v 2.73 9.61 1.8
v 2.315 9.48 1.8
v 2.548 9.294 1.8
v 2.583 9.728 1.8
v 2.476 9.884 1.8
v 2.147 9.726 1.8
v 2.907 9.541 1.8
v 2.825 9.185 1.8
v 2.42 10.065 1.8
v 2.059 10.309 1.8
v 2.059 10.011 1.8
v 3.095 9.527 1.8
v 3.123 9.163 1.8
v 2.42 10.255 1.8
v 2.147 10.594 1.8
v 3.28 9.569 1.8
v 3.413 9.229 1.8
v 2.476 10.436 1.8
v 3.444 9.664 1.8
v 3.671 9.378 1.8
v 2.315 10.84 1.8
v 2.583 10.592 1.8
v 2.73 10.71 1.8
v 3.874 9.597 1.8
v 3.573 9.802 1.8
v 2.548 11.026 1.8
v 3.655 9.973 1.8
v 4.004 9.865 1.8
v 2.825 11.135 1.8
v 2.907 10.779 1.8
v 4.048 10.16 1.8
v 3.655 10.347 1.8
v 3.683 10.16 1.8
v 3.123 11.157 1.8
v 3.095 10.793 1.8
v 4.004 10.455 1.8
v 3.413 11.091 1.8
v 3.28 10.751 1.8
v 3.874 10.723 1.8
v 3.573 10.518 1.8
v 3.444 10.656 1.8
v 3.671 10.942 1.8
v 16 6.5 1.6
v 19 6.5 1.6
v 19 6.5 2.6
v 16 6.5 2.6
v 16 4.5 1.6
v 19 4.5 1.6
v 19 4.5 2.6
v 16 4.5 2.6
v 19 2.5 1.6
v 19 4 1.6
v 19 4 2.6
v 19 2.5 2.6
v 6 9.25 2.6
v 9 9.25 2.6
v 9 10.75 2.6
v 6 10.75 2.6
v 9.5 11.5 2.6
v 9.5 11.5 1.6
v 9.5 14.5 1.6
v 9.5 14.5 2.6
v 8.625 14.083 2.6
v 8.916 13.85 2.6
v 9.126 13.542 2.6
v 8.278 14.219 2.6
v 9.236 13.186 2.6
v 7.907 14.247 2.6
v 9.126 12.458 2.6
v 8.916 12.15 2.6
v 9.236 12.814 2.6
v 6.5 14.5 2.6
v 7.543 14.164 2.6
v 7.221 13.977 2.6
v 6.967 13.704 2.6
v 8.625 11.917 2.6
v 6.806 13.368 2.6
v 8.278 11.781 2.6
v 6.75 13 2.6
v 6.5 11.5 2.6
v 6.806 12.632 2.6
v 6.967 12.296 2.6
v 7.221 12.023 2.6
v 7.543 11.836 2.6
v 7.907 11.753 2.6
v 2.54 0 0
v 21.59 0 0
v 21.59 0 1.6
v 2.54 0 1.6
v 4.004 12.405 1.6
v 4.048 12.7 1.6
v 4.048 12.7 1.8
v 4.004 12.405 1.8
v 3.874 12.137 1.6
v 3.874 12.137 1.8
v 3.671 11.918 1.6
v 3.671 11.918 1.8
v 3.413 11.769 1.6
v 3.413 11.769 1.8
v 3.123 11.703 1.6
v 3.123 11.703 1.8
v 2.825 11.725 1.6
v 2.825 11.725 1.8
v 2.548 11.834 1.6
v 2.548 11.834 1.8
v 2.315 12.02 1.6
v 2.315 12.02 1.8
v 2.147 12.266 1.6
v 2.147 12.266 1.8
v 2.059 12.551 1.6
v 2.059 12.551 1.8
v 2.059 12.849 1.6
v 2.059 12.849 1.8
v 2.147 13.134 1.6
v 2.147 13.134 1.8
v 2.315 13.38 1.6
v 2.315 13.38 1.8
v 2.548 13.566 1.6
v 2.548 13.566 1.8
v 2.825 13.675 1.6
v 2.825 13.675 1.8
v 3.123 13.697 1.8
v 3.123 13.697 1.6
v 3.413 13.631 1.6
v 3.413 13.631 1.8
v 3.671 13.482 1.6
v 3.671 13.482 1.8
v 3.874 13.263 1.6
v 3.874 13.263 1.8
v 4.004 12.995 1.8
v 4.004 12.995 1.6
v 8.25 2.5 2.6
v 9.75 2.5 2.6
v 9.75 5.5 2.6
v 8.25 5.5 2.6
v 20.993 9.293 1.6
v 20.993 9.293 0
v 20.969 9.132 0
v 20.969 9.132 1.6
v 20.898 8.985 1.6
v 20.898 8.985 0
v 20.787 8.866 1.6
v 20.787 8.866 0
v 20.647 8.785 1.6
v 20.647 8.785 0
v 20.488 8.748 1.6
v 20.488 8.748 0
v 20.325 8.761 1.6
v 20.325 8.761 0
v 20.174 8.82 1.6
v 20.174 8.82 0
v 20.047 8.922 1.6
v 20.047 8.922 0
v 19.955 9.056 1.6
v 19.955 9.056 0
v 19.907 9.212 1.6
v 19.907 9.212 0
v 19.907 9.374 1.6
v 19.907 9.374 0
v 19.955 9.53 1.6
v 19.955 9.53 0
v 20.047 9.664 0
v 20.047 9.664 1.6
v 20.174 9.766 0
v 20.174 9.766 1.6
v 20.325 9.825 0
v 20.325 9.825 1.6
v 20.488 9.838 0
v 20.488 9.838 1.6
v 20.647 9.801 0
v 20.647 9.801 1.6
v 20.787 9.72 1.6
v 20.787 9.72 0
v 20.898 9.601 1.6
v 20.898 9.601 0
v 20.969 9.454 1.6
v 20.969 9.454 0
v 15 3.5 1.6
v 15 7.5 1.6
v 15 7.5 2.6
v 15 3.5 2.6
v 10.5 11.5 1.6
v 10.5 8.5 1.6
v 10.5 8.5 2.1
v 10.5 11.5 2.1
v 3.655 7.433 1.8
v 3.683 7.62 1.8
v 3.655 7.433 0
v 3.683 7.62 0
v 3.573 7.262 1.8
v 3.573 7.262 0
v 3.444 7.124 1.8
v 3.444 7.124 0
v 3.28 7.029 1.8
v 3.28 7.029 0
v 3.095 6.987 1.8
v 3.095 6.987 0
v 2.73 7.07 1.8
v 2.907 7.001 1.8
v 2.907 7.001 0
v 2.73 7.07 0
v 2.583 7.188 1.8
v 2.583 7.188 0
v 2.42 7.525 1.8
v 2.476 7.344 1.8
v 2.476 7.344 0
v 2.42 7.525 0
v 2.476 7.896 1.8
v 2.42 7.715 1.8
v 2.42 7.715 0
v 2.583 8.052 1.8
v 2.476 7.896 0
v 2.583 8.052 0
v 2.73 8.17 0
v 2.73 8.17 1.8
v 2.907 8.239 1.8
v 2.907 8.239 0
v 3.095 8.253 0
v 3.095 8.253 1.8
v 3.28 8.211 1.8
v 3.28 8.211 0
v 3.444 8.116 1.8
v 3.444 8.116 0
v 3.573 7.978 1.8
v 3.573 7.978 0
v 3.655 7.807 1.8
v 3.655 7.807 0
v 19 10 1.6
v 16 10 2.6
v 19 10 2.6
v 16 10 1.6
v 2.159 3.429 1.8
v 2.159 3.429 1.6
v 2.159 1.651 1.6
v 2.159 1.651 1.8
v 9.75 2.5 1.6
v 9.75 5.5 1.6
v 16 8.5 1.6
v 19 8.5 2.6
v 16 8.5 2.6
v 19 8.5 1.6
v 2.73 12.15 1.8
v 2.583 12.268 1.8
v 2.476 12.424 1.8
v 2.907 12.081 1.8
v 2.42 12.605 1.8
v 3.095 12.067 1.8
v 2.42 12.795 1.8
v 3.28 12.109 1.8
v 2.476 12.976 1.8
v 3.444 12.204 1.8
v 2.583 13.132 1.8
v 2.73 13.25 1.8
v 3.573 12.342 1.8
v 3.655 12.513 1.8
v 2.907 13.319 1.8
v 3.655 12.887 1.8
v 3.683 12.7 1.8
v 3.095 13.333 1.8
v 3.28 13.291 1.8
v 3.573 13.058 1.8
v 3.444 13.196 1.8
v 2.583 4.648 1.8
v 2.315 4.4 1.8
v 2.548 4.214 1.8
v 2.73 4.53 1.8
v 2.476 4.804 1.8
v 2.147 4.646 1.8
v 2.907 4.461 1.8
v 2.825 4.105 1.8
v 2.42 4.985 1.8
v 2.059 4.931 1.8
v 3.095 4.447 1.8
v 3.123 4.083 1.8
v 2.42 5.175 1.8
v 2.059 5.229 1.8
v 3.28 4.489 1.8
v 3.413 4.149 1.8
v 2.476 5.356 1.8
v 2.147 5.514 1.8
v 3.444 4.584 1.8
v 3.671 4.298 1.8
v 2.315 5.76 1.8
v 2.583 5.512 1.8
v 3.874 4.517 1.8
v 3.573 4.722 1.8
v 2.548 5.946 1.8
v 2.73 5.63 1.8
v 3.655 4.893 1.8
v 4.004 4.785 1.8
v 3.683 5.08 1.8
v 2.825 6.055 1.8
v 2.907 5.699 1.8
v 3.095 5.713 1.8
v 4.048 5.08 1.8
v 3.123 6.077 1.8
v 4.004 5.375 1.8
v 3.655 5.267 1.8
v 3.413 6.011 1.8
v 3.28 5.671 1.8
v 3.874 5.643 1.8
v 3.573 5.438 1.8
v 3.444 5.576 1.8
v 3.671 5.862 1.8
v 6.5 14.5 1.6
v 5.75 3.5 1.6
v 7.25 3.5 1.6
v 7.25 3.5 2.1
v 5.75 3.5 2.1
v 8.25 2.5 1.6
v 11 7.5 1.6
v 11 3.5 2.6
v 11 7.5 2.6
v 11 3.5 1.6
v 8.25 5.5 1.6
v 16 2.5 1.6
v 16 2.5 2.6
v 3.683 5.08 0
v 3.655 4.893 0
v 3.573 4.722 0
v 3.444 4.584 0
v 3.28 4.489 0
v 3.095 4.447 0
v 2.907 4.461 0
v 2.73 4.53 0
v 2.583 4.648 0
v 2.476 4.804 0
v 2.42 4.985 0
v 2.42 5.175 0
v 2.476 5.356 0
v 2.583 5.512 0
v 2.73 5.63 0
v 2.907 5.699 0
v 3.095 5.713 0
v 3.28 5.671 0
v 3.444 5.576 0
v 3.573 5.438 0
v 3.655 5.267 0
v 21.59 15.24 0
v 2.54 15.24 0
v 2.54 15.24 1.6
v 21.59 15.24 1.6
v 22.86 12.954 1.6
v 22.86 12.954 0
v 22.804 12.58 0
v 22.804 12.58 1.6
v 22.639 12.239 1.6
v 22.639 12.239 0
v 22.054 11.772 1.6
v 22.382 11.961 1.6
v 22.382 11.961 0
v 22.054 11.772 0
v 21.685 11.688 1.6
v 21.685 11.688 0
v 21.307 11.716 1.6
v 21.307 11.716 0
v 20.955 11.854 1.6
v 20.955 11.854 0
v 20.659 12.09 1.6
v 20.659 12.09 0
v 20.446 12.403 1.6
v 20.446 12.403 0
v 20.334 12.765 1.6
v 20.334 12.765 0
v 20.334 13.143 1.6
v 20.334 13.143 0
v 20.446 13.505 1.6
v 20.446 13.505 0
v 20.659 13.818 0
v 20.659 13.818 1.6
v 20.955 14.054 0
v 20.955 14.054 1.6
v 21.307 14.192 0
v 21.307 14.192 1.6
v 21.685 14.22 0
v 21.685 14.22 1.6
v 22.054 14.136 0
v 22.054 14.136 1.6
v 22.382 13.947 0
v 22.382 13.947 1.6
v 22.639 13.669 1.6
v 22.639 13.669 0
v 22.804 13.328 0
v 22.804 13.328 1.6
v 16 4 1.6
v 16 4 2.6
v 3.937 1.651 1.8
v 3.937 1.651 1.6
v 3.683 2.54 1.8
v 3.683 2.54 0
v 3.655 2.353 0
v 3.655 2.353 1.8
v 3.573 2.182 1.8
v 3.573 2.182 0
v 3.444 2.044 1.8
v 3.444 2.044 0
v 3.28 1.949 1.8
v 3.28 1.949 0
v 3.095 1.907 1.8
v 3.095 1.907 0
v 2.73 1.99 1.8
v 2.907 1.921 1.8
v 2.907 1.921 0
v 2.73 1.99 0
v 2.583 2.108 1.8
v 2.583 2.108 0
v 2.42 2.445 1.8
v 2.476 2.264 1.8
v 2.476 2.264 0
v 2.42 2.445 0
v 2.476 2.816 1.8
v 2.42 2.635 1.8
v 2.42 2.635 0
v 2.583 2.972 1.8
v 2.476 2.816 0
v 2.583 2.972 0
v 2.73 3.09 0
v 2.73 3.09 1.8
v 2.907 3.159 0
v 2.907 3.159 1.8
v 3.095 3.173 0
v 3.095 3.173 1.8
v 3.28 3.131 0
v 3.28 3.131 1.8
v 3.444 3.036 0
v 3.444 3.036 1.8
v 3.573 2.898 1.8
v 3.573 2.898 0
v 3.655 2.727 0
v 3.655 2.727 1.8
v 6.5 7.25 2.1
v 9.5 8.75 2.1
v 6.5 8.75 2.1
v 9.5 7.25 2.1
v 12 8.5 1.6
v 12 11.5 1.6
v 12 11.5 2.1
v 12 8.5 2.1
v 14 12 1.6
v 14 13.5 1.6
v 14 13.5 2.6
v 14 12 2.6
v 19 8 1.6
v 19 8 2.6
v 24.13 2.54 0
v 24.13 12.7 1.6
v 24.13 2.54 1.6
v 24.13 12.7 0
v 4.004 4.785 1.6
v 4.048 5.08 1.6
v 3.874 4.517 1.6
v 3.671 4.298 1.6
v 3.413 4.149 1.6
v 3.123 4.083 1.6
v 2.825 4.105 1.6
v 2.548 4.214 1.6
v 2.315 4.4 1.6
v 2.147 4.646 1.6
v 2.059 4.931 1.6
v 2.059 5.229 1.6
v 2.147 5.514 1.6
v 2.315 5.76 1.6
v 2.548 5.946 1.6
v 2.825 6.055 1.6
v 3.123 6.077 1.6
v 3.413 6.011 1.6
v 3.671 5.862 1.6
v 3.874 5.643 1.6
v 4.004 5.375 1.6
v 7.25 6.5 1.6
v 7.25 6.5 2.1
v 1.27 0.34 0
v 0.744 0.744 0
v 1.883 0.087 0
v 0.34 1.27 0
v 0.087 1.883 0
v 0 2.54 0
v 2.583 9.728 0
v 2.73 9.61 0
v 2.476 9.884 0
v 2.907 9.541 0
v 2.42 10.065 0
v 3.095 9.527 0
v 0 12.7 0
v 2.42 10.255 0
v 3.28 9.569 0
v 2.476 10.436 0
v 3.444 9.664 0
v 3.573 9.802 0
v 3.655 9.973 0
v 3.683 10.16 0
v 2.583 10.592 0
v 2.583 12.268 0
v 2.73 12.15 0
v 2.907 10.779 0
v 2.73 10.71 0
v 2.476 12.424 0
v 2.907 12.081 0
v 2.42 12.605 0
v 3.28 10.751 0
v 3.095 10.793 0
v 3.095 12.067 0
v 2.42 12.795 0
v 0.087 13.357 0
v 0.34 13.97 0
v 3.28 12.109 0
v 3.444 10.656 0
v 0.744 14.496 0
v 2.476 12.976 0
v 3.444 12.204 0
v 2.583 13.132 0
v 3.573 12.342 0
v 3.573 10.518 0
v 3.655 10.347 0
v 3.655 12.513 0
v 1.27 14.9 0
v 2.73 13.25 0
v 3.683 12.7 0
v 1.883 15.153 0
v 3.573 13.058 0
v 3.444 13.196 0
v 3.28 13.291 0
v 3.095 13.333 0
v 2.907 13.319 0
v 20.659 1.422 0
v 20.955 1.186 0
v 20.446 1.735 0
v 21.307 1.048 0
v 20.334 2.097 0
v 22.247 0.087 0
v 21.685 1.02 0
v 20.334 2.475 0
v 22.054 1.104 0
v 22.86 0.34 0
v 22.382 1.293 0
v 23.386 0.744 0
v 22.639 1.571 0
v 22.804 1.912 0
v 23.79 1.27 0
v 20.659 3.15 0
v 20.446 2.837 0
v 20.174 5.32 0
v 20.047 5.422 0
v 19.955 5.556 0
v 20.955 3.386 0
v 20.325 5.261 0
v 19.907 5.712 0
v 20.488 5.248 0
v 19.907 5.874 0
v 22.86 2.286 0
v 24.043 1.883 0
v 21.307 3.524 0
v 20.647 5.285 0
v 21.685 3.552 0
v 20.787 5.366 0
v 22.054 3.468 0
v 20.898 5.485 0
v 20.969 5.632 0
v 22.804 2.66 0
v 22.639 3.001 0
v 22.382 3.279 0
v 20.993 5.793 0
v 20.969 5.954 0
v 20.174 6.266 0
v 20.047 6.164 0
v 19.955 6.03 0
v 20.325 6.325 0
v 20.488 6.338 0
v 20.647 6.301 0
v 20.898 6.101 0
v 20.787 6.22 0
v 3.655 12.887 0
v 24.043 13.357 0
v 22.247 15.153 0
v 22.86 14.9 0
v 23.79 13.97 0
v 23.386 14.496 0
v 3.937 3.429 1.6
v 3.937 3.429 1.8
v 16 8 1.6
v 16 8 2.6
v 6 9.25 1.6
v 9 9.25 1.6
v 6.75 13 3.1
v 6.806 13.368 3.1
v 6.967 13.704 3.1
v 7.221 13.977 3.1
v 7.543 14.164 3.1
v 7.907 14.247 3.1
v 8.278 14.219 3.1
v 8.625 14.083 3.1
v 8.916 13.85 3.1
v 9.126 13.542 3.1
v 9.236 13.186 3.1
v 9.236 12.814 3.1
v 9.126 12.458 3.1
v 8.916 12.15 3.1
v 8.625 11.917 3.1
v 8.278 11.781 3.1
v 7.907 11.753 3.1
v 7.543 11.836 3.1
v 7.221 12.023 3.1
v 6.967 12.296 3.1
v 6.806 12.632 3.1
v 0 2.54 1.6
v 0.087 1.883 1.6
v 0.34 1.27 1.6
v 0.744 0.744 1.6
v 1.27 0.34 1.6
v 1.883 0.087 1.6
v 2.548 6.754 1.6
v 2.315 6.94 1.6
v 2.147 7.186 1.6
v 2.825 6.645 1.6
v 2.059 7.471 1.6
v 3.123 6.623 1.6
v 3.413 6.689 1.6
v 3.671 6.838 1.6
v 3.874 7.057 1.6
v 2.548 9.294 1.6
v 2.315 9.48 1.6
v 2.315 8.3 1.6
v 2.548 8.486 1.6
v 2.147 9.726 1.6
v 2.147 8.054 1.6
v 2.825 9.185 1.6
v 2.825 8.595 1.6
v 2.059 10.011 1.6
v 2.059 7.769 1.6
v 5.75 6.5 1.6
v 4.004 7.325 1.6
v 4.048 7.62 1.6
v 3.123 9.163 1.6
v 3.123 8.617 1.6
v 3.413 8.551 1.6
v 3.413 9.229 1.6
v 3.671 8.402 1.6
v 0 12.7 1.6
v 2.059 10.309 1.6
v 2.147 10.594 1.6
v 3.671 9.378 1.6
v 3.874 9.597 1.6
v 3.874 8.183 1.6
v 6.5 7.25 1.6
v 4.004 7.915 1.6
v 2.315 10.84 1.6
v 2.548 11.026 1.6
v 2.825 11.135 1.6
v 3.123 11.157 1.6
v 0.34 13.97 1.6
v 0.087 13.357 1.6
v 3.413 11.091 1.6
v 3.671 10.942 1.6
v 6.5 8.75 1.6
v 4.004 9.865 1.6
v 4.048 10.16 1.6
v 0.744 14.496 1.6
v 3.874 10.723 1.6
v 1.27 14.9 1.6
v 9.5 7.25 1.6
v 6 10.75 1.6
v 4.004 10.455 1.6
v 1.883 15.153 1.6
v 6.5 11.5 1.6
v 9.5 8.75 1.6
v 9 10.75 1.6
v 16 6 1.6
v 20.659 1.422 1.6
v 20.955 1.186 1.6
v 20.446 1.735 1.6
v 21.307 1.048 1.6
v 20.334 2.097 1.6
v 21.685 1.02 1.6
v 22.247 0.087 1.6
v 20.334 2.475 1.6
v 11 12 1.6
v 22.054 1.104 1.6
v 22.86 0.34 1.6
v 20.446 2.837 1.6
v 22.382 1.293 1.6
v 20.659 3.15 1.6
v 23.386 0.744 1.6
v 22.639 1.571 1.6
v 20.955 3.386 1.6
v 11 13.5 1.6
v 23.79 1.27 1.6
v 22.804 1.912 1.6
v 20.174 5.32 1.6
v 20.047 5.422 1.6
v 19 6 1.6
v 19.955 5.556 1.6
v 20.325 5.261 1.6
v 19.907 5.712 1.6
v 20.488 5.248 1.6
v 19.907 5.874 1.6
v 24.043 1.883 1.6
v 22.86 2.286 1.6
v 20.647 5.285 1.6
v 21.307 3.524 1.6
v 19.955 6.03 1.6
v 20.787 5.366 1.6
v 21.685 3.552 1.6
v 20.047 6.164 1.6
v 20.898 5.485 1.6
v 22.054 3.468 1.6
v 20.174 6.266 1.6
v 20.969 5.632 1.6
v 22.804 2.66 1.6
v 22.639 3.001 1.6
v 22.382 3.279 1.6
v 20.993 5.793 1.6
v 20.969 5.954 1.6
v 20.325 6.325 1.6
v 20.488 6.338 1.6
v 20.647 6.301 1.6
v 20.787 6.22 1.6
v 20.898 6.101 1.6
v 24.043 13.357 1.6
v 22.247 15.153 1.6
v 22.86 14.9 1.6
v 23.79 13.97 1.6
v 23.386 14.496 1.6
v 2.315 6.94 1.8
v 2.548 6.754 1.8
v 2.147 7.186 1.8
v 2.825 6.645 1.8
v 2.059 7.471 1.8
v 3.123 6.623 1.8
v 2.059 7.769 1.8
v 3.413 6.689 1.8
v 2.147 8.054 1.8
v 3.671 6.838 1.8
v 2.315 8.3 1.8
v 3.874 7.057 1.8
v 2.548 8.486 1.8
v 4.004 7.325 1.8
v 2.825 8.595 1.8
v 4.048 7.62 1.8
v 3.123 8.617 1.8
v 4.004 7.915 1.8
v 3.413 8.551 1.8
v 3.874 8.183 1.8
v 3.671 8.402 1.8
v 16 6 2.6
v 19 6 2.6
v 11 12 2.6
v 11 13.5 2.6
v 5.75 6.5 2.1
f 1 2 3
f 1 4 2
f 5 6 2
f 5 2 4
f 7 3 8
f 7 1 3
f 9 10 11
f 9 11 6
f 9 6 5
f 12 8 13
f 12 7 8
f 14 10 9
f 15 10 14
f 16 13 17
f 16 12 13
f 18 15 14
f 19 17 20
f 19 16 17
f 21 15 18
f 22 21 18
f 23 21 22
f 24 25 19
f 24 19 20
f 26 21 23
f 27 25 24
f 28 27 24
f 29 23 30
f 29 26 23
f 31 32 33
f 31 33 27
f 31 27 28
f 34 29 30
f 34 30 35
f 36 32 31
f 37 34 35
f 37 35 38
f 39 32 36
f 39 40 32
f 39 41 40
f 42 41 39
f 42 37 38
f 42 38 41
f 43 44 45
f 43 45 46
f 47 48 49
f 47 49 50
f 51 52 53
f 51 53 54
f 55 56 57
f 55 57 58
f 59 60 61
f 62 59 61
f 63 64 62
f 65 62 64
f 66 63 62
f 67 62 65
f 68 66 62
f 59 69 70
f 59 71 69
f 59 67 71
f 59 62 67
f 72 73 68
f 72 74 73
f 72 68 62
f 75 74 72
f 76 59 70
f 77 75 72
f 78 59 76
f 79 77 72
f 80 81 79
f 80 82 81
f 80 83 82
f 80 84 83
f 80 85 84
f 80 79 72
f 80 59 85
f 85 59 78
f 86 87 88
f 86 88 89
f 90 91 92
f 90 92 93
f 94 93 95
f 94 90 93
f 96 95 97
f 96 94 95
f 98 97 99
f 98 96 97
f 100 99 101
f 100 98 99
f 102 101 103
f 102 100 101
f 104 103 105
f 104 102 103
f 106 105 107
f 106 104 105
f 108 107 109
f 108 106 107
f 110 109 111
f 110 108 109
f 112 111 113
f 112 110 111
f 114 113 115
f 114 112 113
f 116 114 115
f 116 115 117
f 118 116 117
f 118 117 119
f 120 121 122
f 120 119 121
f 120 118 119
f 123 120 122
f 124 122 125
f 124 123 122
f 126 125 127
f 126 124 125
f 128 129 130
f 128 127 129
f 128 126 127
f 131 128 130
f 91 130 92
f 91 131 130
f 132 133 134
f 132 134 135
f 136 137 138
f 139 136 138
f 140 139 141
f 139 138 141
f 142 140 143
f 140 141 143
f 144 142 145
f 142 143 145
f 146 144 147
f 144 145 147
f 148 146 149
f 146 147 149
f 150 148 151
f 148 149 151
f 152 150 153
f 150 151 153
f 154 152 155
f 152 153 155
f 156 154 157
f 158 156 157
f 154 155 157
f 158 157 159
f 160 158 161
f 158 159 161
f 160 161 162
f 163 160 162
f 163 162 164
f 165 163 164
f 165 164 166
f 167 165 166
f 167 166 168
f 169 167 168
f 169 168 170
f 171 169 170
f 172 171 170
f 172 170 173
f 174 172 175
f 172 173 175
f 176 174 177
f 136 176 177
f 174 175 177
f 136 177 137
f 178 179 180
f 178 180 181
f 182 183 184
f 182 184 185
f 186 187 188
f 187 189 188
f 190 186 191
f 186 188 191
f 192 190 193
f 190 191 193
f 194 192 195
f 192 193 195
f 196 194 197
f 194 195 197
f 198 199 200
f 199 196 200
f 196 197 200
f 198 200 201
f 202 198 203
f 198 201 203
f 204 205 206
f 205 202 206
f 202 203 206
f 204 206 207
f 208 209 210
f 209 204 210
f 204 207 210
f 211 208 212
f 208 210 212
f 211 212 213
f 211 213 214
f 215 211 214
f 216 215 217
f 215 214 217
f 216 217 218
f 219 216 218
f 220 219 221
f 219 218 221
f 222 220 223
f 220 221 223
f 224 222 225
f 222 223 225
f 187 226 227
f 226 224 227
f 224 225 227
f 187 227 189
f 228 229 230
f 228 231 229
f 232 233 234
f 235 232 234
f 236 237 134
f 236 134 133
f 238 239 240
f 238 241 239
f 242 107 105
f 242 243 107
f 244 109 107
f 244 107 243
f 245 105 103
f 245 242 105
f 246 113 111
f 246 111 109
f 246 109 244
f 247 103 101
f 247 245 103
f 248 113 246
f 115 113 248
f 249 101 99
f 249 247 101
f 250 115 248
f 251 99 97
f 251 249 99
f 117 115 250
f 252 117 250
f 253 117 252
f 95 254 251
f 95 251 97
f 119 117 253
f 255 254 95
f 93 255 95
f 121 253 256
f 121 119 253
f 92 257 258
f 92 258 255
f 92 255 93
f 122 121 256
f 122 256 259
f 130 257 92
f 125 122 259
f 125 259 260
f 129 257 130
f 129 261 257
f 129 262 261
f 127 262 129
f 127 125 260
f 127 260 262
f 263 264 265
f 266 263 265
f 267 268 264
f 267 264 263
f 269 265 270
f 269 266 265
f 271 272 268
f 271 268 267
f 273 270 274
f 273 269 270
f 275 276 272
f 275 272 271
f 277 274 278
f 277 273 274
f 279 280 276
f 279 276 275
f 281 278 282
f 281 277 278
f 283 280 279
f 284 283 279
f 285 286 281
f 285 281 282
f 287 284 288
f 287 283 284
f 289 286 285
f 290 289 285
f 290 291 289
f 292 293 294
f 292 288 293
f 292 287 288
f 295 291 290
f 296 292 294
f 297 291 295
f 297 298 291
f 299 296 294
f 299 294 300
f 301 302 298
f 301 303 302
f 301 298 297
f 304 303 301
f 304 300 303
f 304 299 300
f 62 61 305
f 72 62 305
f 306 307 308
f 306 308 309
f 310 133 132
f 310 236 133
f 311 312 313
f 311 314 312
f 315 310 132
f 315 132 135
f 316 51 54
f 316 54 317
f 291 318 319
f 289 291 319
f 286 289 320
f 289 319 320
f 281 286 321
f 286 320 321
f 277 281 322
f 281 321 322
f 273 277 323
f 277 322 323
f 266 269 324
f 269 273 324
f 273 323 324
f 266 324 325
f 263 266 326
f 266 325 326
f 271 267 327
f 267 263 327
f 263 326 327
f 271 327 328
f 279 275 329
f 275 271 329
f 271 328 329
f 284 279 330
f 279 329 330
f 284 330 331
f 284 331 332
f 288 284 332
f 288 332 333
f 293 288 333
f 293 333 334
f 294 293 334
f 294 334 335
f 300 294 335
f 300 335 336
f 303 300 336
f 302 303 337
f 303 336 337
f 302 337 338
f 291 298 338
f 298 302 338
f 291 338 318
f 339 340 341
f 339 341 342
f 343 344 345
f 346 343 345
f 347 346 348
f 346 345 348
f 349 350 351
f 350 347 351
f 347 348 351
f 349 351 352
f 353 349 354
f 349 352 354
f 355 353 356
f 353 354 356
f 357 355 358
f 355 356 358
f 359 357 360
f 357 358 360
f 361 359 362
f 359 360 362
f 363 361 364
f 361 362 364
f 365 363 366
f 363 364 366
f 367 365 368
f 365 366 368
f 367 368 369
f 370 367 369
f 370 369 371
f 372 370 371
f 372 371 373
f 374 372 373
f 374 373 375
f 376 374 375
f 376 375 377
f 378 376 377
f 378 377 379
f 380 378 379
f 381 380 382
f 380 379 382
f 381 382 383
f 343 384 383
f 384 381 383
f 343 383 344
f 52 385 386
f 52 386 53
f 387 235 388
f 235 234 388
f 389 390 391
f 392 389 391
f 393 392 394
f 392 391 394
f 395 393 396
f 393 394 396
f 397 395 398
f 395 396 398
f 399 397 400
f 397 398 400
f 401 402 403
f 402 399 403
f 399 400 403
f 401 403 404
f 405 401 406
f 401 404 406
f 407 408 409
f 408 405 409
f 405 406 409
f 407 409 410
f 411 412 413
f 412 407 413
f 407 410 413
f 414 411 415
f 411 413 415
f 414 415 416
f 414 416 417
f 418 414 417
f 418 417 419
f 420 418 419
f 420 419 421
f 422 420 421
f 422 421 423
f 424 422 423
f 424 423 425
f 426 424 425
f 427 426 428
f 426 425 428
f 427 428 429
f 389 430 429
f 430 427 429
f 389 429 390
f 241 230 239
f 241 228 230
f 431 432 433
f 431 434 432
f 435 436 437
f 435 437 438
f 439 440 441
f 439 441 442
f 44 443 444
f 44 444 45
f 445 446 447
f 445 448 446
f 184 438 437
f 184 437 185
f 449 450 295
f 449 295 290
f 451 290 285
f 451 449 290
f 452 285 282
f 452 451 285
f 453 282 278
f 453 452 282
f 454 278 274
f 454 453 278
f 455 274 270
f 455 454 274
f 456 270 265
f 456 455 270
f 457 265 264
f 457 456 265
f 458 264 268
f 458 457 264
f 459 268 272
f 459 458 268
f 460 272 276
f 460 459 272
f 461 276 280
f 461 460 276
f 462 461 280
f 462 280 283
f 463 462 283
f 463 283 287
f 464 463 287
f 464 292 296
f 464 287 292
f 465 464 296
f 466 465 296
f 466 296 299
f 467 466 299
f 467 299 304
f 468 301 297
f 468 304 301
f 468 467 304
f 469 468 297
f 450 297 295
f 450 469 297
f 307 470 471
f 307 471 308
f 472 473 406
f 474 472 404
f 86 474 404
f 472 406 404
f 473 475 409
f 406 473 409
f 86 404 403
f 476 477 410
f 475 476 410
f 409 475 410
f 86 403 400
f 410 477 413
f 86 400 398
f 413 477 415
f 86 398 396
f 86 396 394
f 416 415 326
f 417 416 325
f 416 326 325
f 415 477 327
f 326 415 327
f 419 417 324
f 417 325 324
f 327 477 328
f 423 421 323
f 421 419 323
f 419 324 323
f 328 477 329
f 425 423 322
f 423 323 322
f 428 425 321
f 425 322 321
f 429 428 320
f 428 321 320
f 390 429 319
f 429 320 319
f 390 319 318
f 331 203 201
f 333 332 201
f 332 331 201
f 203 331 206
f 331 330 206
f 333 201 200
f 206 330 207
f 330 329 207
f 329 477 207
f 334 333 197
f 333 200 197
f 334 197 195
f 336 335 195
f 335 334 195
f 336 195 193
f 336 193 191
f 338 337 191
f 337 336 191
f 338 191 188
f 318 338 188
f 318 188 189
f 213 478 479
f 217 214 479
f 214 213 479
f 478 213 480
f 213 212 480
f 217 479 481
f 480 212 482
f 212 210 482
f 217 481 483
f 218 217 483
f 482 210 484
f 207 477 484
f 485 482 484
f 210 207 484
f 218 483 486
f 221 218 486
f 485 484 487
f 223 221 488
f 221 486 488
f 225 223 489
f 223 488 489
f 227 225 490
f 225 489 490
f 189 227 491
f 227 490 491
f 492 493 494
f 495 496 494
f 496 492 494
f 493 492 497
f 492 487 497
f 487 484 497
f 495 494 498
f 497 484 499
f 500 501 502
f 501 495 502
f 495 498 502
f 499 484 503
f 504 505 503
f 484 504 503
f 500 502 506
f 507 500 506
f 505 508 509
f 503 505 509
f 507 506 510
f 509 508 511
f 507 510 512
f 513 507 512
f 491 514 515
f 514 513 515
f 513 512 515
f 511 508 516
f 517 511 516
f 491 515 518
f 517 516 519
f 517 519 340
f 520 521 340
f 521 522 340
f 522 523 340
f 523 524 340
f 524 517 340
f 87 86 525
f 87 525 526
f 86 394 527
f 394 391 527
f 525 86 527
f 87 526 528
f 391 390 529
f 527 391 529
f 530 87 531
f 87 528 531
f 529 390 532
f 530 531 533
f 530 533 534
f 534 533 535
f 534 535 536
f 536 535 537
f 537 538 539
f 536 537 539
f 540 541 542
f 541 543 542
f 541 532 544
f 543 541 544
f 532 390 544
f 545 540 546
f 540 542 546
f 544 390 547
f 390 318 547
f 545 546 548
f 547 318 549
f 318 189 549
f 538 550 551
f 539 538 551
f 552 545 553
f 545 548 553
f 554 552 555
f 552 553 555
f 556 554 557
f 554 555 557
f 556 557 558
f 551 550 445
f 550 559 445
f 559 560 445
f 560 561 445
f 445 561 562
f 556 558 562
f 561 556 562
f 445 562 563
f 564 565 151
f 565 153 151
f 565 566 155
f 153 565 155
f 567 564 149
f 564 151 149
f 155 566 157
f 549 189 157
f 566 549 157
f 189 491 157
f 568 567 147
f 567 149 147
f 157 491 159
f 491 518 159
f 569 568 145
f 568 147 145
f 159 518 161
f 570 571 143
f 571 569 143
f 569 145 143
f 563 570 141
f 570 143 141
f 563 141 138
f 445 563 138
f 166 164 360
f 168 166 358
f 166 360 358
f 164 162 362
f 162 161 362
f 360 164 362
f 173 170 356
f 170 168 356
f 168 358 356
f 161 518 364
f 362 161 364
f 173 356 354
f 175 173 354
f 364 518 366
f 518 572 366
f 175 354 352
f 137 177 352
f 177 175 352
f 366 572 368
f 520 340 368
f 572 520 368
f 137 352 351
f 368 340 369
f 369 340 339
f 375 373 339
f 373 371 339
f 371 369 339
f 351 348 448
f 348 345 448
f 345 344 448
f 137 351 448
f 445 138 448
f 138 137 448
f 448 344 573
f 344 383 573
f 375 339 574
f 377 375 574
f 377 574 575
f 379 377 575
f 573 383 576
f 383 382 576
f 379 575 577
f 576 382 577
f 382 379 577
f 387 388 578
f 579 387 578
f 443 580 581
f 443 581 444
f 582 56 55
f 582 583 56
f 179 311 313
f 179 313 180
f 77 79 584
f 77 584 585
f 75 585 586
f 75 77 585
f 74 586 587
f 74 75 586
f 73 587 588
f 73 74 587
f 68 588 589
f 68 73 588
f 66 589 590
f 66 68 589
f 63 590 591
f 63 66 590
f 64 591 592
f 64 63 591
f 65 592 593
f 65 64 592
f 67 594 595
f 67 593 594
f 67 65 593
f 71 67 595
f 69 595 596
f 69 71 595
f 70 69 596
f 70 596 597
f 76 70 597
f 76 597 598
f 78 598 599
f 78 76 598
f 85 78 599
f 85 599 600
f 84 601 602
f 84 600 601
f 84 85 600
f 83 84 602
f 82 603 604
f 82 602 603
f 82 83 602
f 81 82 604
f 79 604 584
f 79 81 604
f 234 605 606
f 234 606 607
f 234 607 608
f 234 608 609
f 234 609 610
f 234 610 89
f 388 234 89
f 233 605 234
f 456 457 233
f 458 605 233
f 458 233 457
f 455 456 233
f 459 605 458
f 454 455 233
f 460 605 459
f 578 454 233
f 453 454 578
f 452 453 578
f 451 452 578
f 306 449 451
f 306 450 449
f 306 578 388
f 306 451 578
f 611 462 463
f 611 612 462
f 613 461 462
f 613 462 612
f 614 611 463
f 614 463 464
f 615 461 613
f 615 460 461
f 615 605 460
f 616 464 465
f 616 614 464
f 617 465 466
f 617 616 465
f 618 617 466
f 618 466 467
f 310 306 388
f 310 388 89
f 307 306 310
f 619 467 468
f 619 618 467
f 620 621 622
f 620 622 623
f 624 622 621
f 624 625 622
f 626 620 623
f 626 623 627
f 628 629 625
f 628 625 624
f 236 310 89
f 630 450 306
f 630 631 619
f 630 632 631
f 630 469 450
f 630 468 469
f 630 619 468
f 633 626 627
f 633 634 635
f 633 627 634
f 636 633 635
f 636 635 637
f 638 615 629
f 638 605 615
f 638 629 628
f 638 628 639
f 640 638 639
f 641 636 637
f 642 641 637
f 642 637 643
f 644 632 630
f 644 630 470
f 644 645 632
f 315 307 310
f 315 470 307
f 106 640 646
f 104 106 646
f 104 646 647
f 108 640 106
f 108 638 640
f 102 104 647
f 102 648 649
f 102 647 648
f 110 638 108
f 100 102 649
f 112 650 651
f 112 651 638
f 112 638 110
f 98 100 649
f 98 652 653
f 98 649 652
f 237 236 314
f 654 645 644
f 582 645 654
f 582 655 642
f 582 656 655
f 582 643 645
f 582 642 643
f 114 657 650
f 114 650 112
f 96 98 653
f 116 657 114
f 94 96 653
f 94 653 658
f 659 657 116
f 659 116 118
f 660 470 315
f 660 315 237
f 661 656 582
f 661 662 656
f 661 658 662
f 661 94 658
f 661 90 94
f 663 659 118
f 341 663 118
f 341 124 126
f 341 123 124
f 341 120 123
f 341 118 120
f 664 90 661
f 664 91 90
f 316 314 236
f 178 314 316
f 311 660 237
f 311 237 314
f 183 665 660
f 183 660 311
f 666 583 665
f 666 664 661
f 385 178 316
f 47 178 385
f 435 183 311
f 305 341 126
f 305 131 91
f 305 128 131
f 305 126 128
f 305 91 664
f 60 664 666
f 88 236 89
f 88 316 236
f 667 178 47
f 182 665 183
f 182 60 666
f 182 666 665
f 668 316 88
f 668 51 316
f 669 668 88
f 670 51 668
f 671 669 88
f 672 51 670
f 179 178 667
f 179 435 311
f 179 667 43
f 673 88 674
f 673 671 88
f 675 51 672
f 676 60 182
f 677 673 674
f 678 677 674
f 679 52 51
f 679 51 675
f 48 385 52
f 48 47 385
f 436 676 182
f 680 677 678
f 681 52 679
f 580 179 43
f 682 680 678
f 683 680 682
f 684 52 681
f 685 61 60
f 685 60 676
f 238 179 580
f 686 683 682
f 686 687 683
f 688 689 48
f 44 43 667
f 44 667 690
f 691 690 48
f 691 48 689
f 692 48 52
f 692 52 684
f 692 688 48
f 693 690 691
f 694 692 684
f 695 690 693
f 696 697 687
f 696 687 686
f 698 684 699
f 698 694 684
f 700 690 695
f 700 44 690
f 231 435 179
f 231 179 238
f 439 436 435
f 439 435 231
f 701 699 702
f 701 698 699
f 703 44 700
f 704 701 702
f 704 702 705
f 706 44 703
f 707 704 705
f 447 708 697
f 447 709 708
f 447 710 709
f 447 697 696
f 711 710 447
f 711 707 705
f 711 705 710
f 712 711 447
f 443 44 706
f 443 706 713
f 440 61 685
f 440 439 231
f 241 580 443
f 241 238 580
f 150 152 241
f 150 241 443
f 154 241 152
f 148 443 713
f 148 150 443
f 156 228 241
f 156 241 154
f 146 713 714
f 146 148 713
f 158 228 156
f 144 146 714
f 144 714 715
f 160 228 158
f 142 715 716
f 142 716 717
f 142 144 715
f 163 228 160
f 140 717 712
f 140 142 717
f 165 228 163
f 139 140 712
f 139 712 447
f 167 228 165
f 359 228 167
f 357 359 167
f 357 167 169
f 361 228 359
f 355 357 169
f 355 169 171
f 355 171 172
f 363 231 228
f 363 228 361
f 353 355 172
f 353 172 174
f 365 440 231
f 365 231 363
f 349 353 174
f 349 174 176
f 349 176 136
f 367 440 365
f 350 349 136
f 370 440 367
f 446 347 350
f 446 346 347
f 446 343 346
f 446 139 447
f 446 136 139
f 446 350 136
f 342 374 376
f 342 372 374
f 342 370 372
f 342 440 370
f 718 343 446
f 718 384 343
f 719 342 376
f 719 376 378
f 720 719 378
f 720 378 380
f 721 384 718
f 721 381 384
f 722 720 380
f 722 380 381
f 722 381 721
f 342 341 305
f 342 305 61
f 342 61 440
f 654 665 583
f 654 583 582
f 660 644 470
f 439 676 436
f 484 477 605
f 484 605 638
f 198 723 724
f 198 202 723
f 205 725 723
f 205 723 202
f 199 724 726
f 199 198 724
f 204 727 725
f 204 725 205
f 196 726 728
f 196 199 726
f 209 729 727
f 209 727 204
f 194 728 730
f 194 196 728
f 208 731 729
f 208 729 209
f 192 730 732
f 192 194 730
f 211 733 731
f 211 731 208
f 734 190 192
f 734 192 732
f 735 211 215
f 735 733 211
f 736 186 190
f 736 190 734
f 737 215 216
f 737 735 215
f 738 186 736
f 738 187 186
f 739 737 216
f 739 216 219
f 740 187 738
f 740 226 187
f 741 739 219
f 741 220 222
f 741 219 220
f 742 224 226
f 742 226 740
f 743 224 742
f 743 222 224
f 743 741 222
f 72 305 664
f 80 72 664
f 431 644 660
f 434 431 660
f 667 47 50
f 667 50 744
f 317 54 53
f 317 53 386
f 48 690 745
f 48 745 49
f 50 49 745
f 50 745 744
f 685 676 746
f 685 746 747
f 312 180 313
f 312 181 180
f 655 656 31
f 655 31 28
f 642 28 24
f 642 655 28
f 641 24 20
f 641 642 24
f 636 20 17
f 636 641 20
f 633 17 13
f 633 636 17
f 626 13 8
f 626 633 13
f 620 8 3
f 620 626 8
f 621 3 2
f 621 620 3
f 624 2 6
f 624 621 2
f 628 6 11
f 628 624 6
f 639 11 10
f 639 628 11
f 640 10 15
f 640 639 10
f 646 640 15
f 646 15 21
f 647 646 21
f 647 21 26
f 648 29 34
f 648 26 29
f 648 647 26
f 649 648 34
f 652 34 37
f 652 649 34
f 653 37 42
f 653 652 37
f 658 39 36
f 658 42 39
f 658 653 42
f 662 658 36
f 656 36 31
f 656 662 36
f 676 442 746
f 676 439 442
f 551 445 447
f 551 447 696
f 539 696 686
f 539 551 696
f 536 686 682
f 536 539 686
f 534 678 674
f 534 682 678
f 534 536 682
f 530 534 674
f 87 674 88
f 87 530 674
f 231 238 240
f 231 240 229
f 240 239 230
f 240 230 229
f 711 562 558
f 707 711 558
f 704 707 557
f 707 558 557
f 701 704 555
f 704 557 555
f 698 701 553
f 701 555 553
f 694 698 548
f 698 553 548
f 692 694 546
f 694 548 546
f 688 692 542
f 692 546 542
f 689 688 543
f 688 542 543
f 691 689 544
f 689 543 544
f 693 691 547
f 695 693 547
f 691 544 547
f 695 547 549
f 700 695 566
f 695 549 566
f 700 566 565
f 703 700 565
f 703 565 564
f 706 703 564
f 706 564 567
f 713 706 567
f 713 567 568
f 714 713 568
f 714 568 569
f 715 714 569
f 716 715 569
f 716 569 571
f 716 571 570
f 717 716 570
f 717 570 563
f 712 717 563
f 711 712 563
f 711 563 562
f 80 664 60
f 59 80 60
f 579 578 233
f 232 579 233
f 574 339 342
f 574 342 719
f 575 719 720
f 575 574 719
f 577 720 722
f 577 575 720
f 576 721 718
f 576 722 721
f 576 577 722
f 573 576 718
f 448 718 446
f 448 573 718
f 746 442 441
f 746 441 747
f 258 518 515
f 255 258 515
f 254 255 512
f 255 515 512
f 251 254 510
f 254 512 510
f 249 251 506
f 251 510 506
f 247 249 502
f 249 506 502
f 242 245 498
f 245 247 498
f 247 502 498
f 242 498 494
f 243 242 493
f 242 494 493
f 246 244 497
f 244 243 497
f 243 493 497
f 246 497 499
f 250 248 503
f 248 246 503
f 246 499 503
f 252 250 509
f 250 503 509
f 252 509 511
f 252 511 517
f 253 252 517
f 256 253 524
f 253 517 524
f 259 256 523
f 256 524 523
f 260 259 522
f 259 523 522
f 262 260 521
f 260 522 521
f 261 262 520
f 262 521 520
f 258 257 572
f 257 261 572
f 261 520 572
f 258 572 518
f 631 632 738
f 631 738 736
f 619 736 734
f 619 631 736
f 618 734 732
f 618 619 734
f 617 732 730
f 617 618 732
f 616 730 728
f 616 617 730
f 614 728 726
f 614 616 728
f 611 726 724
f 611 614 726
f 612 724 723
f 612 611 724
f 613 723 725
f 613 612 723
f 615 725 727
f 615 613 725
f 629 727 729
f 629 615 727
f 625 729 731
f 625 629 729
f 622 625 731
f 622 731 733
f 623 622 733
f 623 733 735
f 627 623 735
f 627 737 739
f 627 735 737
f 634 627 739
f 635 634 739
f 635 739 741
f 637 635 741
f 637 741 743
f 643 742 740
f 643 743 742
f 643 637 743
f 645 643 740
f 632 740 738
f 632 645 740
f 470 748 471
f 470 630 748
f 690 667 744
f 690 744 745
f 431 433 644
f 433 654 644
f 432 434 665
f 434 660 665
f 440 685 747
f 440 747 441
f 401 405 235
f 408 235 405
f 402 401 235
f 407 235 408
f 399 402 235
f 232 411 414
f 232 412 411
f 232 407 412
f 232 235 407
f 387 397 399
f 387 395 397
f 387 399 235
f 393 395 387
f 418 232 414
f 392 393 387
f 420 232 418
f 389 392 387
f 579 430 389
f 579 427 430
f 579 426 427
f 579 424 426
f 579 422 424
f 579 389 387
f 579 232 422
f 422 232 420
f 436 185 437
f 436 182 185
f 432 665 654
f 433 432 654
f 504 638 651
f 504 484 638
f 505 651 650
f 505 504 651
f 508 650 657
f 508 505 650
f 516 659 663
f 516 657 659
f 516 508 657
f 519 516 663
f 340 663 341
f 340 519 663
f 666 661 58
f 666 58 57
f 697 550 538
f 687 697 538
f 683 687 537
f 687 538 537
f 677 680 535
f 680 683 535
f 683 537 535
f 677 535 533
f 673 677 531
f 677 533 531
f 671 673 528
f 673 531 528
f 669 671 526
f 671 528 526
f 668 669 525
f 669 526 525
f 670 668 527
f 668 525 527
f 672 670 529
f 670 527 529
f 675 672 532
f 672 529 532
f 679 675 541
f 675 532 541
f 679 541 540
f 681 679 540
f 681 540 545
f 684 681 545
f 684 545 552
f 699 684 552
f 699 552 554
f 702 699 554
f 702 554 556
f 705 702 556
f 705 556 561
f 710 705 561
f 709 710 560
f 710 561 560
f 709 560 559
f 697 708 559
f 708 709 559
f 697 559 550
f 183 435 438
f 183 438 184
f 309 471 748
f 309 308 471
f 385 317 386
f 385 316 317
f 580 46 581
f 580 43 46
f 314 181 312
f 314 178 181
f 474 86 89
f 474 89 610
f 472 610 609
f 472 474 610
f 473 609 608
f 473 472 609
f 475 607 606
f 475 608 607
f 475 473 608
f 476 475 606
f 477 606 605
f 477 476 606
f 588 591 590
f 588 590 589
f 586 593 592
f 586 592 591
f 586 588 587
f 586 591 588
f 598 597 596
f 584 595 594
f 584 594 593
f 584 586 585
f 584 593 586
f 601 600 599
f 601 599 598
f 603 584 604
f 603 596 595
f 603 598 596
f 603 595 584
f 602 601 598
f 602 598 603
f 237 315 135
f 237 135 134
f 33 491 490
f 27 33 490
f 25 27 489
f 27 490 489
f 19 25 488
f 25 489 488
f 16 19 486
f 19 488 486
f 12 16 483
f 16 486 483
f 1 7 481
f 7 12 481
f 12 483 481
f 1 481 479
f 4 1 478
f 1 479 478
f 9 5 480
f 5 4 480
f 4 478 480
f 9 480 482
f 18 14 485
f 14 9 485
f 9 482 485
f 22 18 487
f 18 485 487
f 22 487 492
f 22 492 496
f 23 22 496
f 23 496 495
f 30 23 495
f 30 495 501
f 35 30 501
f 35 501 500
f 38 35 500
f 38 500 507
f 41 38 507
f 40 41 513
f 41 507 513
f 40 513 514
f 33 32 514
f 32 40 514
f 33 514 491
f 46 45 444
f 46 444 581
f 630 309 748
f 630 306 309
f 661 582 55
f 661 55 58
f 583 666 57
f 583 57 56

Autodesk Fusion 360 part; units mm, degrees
sketch "Sketch1" plane through (0, 0, 0) normal (0, 0, 1) x (1, 0, 0)
  arc A0 (21.59, 0) -> (24.13, 2.54) centre (21.59, 2.54) ccw
  arc A1 (0, 2.54) -> (2.54, 0) centre (2.54, 2.54) ccw
  line L0 (21.59, 0) -> (2.54, 0)
  arc A2 (2.54, 15.24) -> (0, 12.7) centre (2.54, 12.7) ccw
  line L1 (24.13, 12.7) -> (24.13, 2.54)
  line L2 (0, 2.54) -> (0, 12.7)
  line L3 (2.54, 15.24) -> (21.59, 15.24)
  arc A3 (24.13, 12.7) -> (21.59, 15.24) centre (21.59, 12.7) ccw
  arc A4 (20.9931, 9.293) -> (19.9009, 9.293) centre (20.447, 9.293) ccw
  line L4 (2.159, 1.651) -> (3.937, 1.651)
  line L5 (3.937, 1.651) -> (3.937, 3.429)
  line L6 (2.159, 1.651) -> (3.937, 1.651)
  line L7 (3.937, 1.651) -> (3.937, 3.429)
  line L8 (3.937, 3.429) -> (2.159, 3.429)
  arc A5 (20.9931, 5.793) -> (19.9009, 5.793) centre (20.447, 5.793) ccw
  arc A6 (19.9009, 9.293) -> (20.9931, 9.293) centre (20.447, 9.293) ccw
  arc A7 (19.9009, 9.293) -> (20.9931, 9.293) centre (20.447, 9.293) ccw
  line L9 (2.159, 3.429) -> (2.159, 1.651)
  line L10 (2.159, 3.429) -> (2.159, 1.651)
  arc A8 (20.9931, 9.293) -> (19.9009, 9.293) centre (20.447, 9.293) ccw
  arc A9 (19.9009, 5.793) -> (20.9931, 5.793) centre (20.447, 5.793) ccw
  arc A10 (20.9931, 5.793) -> (19.9009, 5.793) centre (20.447, 5.793) ccw
  line L11 (3.937, 3.429) -> (2.159, 3.429)
  arc A11 (19.9009, 5.793) -> (20.9931, 5.793) centre (20.447, 5.793) ccw
  circle A12 centre (21.59, 2.286) radius 1.27
  circle A13 centre (21.59, 12.954) radius 1.27
  circle A14 centre (3.048, 2.54) radius 0.635
  circle A15 centre (3.048, 5.08) radius 0.635
  circle A16 centre (3.048, 7.62) radius 0.635
  circle A17 centre (3.048, 10.16) radius 0.635
  circle A18 centre (3.048, 12.7) radius 0.635
  circle A19 centre (3.048, 5.08) radius 1
  circle A20 centre (3.048, 7.62) radius 1
  circle A21 centre (3.048, 10.16) radius 1
  circle A22 centre (3.048, 12.7) radius 1
  dimension "d1" = 2.54
  dimension "d2" = 2.54
  dimension "d5" = 1.27
  dimension "d8" = 0
  dimension "d9" = 2.54
  dimension "d10" = 2
  dimension "d13" = 0
  dimension "d14" = 2.54
extrude "Extrude1" add sketch "Sketch1" along normal blind 1.6 contours A0 A1 L0 A2 L1 L2 L3 A3 | L4 L5 L6 L7 L8 L9 L10 L11 | A19 | A20 | A21 | A22
extrude "Extrude2" add sketch "Sketch1" along normal blind 0.2 from surface at 1.6 contours L4 L5 L6 L7 L8 L9 L10 L11 | A19 | A20 | A21 | A22
sketch "Sketch2" plane through (0, 0, 1.6) normal (0, 0, 1) x (-1, 0, 0)
  circle A0 centre (-3.048, -12.7) radius 1
  line L0 (-3.937, -1.651) -> (-2.159, -1.651)
  line L1 (-2.159, -1.651) -> (-2.159, -3.429)
  line L2 (-2.159, -3.429) -> (-3.937, -3.429)
  line L3 (-3.937, -3.429) -> (-3.937, -1.651)
  circle A1 centre (-3.048, -10.16) radius 1
  circle A2 centre (-3.048, -5.08) radius 1
  circle A3 centre (-3.048, -7.62) radius 1
  circle A4 centre (-21.59, -2.286) radius 1.27
  circle A5 centre (-20.447, -9.293) radius 0.5461
  circle A6 centre (-21.59, -12.954) radius 1.27
  circle A7 centre (-20.447, -5.793) radius 0.5461
  arc A8 (-21.59, 0) -> (-24.13, -2.54) centre (-21.59, -2.54) ccw
  line L4 (-24.13, -2.54) -> (-24.13, -12.7)
  arc A9 (-24.13, -12.7) -> (-21.59, -15.24) centre (-21.59, -12.7) ccw
  line L5 (-21.59, -15.24) -> (-2.54, -15.24)
  arc A10 (-2.54, -15.24) -> (0, -12.7) centre (-2.54, -12.7) ccw
  line L6 (0, -12.7) -> (0, -2.54)
  arc A11 (0, -2.54) -> (-2.54, 0) centre (-2.54, -2.54) ccw
  line L7 (-2.54, 0) -> (-21.59, 0)
  line L8 (-7.25, -3.5) -> (-5.75, -3.5)
  line L9 (-5.75, -3.5) -> (-5.75, -6.5)
  line L10 (-5.75, -6.5) -> (-7.25, -6.5)
  line L11 (-7.25, -6.5) -> (-7.25, -3.5)
  line L12 (-7.25, -3.5) -> (-5.75, -6.5) construction
  line L13 (-5.75, -3.5) -> (-7.25, -6.5) construction
  line L14 (-9.75, -2.5) -> (-8.25, -2.5)
  line L15 (-8.25, -2.5) -> (-8.25, -5.5)
  line L16 (-8.25, -5.5) -> (-9.75, -5.5)
  line L17 (-9.75, -5.5) -> (-9.75, -2.5)
  line L18 (-9.75, -2.5) -> (-8.25, -5.5) construction
  line L19 (-8.25, -2.5) -> (-9.75, -5.5) construction
  line L20 (-15, -3.5) -> (-11, -3.5)
  line L21 (-11, -3.5) -> (-11, -7.5)
  line L22 (-11, -7.5) -> (-15, -7.5)
  line L23 (-15, -7.5) -> (-15, -3.5)
  line L24 (-15, -3.5) -> (-11, -7.5) construction
  line L25 (-11, -3.5) -> (-15, -7.5) construction
  line L26 (-9, -9.25) -> (-6, -9.25)
  line L27 (-6, -9.25) -> (-6, -10.75)
  line L28 (-6, -10.75) -> (-9, -10.75)
  line L29 (-9, -10.75) -> (-9, -9.25)
  line L30 (-9, -9.25) -> (-6, -10.75) construction
  line L31 (-6, -9.25) -> (-9, -10.75) construction
  line L32 (-6.5, -7.25) -> (-9.5, -7.25)
  line L33 (-9.5, -7.25) -> (-9.5, -8.75)
  line L34 (-9.5, -8.75) -> (-6.5, -8.75)
  line L35 (-6.5, -8.75) -> (-6.5, -7.25)
  line L36 (-6.5, -7.25) -> (-9.5, -8.75) construction
  line L37 (-9.5, -7.25) -> (-6.5, -8.75) construction
  circle A12 centre (-8, -13) radius 1.25
  line L38 (-14, -12) -> (-11, -12)
  line L39 (-11, -12) -> (-11, -13.5)
  line L40 (-11, -13.5) -> (-14, -13.5)
  line L41 (-14, -13.5) -> (-14, -12)
  line L42 (-14, -12) -> (-11, -13.5) construction
  line L43 (-11, -12) -> (-14, -13.5) construction
  line L44 (-12, -8.5) -> (-10.5, -8.5)
  line L45 (-10.5, -8.5) -> (-10.5, -11.5)
  line L46 (-10.5, -11.5) -> (-12, -11.5)
  line L47 (-12, -11.5) -> (-12, -8.5)
  line L48 (-12, -8.5) -> (-10.5, -11.5) construction
  line L49 (-10.5, -8.5) -> (-12, -11.5) construction
  line L50 (-19, -2.5) -> (-16, -2.5)
  line L51 (-16, -2.5) -> (-16, -4)
  line L52 (-16, -4) -> (-19, -4)
  line L53 (-19, -4) -> (-19, -2.5)
  line L54 (-19, -2.5) -> (-16, -4) construction
  line L55 (-16, -2.5) -> (-19, -4) construction
  line L56 (-19, -6) -> (-19, -4.5)
  line L57 (-19, -4.5) -> (-16, -4.5)
  line L58 (-16, -4.5) -> (-16, -6)
  line L59 (-16, -6) -> (-19, -6)
  line L60 (-19, -8) -> (-19, -6.5)
  line L61 (-19, -6.5) -> (-16, -6.5)
  line L62 (-16, -6.5) -> (-16, -8)
  line L63 (-16, -8) -> (-19, -8)
  line L64 (-19, -10) -> (-19, -8.5)
  line L65 (-19, -8.5) -> (-16, -8.5)
  line L66 (-16, -8.5) -> (-16, -10)
  line L67 (-16, -10) -> (-19, -10)
  line L68 (-6.5, -11.5) -> (-9.5, -11.5)
  line L69 (-9.5, -11.5) -> (-9.5, -14.5)
  line L70 (-9.5, -14.5) -> (-6.5, -14.5)
  line L71 (-6.5, -14.5) -> (-6.5, -11.5)
  line L72 (-6.5, -11.5) -> (-9.5, -14.5) construction
  line L73 (-9.5, -11.5) -> (-6.5, -14.5) construction
  point P0 (-6.5, -5)
  point P1 (-9, -4)
  point P2 (-13, -5.5)
  point P3 (-7.5, -10)
  point P4 (-8, -8)
  point P5 (-12.5, -12.75)
  point P6 (-11.25, -10)
  point P7 (-17.5, -3.25)
  point P8 (-8, -13)
  dimension "d18" = 1.5
  dimension "d19" = 3
  dimension "d20" = 1.5
  dimension "d21" = 3
  dimension "d22" = 4
  dimension "d23" = 4
  dimension "d24" = 3
  dimension "d25" = 1.5
  dimension "d26" = 3
  dimension "d27" = 1.5
  dimension "d28" = 2.5
  dimension "d29" = 1.5
  dimension "d30" = 3
  dimension "d31" = 3
  dimension "d32" = 1.5
  dimension "d33" = 3
  dimension "d34" = 1.5
  dimension "d37" = 0
  dimension "d38" = -2
  dimension "d43" = 3
  dimension "d44" = 3
extrude "Extrude3" add sketch "Sketch2" along normal blind 0.5 contours L8 L9 L10 L11 | L32 L33 L34 L35 | L44 L45 L46 L47
extrude "Extrude4" add sketch "Sketch2" along normal blind 1 contours L14 L15 L16 L17 | L20 L21 L22 L23 | L26 L27 L28 L29 | L38 L39 L40 L41 | L50 L51 L52 L53 | L56 L57 L58 L59 | L60 L61 L62 L63 | L64 L65 L66 L67
extrude "Extrude5" add sketch "Sketch2" along normal blind 1 contours A12 | L68 L69 L70 L71
extrude "Extrude6" add sketch "Sketch2" along normal blind 0.5 from surface at 1 contours A12
